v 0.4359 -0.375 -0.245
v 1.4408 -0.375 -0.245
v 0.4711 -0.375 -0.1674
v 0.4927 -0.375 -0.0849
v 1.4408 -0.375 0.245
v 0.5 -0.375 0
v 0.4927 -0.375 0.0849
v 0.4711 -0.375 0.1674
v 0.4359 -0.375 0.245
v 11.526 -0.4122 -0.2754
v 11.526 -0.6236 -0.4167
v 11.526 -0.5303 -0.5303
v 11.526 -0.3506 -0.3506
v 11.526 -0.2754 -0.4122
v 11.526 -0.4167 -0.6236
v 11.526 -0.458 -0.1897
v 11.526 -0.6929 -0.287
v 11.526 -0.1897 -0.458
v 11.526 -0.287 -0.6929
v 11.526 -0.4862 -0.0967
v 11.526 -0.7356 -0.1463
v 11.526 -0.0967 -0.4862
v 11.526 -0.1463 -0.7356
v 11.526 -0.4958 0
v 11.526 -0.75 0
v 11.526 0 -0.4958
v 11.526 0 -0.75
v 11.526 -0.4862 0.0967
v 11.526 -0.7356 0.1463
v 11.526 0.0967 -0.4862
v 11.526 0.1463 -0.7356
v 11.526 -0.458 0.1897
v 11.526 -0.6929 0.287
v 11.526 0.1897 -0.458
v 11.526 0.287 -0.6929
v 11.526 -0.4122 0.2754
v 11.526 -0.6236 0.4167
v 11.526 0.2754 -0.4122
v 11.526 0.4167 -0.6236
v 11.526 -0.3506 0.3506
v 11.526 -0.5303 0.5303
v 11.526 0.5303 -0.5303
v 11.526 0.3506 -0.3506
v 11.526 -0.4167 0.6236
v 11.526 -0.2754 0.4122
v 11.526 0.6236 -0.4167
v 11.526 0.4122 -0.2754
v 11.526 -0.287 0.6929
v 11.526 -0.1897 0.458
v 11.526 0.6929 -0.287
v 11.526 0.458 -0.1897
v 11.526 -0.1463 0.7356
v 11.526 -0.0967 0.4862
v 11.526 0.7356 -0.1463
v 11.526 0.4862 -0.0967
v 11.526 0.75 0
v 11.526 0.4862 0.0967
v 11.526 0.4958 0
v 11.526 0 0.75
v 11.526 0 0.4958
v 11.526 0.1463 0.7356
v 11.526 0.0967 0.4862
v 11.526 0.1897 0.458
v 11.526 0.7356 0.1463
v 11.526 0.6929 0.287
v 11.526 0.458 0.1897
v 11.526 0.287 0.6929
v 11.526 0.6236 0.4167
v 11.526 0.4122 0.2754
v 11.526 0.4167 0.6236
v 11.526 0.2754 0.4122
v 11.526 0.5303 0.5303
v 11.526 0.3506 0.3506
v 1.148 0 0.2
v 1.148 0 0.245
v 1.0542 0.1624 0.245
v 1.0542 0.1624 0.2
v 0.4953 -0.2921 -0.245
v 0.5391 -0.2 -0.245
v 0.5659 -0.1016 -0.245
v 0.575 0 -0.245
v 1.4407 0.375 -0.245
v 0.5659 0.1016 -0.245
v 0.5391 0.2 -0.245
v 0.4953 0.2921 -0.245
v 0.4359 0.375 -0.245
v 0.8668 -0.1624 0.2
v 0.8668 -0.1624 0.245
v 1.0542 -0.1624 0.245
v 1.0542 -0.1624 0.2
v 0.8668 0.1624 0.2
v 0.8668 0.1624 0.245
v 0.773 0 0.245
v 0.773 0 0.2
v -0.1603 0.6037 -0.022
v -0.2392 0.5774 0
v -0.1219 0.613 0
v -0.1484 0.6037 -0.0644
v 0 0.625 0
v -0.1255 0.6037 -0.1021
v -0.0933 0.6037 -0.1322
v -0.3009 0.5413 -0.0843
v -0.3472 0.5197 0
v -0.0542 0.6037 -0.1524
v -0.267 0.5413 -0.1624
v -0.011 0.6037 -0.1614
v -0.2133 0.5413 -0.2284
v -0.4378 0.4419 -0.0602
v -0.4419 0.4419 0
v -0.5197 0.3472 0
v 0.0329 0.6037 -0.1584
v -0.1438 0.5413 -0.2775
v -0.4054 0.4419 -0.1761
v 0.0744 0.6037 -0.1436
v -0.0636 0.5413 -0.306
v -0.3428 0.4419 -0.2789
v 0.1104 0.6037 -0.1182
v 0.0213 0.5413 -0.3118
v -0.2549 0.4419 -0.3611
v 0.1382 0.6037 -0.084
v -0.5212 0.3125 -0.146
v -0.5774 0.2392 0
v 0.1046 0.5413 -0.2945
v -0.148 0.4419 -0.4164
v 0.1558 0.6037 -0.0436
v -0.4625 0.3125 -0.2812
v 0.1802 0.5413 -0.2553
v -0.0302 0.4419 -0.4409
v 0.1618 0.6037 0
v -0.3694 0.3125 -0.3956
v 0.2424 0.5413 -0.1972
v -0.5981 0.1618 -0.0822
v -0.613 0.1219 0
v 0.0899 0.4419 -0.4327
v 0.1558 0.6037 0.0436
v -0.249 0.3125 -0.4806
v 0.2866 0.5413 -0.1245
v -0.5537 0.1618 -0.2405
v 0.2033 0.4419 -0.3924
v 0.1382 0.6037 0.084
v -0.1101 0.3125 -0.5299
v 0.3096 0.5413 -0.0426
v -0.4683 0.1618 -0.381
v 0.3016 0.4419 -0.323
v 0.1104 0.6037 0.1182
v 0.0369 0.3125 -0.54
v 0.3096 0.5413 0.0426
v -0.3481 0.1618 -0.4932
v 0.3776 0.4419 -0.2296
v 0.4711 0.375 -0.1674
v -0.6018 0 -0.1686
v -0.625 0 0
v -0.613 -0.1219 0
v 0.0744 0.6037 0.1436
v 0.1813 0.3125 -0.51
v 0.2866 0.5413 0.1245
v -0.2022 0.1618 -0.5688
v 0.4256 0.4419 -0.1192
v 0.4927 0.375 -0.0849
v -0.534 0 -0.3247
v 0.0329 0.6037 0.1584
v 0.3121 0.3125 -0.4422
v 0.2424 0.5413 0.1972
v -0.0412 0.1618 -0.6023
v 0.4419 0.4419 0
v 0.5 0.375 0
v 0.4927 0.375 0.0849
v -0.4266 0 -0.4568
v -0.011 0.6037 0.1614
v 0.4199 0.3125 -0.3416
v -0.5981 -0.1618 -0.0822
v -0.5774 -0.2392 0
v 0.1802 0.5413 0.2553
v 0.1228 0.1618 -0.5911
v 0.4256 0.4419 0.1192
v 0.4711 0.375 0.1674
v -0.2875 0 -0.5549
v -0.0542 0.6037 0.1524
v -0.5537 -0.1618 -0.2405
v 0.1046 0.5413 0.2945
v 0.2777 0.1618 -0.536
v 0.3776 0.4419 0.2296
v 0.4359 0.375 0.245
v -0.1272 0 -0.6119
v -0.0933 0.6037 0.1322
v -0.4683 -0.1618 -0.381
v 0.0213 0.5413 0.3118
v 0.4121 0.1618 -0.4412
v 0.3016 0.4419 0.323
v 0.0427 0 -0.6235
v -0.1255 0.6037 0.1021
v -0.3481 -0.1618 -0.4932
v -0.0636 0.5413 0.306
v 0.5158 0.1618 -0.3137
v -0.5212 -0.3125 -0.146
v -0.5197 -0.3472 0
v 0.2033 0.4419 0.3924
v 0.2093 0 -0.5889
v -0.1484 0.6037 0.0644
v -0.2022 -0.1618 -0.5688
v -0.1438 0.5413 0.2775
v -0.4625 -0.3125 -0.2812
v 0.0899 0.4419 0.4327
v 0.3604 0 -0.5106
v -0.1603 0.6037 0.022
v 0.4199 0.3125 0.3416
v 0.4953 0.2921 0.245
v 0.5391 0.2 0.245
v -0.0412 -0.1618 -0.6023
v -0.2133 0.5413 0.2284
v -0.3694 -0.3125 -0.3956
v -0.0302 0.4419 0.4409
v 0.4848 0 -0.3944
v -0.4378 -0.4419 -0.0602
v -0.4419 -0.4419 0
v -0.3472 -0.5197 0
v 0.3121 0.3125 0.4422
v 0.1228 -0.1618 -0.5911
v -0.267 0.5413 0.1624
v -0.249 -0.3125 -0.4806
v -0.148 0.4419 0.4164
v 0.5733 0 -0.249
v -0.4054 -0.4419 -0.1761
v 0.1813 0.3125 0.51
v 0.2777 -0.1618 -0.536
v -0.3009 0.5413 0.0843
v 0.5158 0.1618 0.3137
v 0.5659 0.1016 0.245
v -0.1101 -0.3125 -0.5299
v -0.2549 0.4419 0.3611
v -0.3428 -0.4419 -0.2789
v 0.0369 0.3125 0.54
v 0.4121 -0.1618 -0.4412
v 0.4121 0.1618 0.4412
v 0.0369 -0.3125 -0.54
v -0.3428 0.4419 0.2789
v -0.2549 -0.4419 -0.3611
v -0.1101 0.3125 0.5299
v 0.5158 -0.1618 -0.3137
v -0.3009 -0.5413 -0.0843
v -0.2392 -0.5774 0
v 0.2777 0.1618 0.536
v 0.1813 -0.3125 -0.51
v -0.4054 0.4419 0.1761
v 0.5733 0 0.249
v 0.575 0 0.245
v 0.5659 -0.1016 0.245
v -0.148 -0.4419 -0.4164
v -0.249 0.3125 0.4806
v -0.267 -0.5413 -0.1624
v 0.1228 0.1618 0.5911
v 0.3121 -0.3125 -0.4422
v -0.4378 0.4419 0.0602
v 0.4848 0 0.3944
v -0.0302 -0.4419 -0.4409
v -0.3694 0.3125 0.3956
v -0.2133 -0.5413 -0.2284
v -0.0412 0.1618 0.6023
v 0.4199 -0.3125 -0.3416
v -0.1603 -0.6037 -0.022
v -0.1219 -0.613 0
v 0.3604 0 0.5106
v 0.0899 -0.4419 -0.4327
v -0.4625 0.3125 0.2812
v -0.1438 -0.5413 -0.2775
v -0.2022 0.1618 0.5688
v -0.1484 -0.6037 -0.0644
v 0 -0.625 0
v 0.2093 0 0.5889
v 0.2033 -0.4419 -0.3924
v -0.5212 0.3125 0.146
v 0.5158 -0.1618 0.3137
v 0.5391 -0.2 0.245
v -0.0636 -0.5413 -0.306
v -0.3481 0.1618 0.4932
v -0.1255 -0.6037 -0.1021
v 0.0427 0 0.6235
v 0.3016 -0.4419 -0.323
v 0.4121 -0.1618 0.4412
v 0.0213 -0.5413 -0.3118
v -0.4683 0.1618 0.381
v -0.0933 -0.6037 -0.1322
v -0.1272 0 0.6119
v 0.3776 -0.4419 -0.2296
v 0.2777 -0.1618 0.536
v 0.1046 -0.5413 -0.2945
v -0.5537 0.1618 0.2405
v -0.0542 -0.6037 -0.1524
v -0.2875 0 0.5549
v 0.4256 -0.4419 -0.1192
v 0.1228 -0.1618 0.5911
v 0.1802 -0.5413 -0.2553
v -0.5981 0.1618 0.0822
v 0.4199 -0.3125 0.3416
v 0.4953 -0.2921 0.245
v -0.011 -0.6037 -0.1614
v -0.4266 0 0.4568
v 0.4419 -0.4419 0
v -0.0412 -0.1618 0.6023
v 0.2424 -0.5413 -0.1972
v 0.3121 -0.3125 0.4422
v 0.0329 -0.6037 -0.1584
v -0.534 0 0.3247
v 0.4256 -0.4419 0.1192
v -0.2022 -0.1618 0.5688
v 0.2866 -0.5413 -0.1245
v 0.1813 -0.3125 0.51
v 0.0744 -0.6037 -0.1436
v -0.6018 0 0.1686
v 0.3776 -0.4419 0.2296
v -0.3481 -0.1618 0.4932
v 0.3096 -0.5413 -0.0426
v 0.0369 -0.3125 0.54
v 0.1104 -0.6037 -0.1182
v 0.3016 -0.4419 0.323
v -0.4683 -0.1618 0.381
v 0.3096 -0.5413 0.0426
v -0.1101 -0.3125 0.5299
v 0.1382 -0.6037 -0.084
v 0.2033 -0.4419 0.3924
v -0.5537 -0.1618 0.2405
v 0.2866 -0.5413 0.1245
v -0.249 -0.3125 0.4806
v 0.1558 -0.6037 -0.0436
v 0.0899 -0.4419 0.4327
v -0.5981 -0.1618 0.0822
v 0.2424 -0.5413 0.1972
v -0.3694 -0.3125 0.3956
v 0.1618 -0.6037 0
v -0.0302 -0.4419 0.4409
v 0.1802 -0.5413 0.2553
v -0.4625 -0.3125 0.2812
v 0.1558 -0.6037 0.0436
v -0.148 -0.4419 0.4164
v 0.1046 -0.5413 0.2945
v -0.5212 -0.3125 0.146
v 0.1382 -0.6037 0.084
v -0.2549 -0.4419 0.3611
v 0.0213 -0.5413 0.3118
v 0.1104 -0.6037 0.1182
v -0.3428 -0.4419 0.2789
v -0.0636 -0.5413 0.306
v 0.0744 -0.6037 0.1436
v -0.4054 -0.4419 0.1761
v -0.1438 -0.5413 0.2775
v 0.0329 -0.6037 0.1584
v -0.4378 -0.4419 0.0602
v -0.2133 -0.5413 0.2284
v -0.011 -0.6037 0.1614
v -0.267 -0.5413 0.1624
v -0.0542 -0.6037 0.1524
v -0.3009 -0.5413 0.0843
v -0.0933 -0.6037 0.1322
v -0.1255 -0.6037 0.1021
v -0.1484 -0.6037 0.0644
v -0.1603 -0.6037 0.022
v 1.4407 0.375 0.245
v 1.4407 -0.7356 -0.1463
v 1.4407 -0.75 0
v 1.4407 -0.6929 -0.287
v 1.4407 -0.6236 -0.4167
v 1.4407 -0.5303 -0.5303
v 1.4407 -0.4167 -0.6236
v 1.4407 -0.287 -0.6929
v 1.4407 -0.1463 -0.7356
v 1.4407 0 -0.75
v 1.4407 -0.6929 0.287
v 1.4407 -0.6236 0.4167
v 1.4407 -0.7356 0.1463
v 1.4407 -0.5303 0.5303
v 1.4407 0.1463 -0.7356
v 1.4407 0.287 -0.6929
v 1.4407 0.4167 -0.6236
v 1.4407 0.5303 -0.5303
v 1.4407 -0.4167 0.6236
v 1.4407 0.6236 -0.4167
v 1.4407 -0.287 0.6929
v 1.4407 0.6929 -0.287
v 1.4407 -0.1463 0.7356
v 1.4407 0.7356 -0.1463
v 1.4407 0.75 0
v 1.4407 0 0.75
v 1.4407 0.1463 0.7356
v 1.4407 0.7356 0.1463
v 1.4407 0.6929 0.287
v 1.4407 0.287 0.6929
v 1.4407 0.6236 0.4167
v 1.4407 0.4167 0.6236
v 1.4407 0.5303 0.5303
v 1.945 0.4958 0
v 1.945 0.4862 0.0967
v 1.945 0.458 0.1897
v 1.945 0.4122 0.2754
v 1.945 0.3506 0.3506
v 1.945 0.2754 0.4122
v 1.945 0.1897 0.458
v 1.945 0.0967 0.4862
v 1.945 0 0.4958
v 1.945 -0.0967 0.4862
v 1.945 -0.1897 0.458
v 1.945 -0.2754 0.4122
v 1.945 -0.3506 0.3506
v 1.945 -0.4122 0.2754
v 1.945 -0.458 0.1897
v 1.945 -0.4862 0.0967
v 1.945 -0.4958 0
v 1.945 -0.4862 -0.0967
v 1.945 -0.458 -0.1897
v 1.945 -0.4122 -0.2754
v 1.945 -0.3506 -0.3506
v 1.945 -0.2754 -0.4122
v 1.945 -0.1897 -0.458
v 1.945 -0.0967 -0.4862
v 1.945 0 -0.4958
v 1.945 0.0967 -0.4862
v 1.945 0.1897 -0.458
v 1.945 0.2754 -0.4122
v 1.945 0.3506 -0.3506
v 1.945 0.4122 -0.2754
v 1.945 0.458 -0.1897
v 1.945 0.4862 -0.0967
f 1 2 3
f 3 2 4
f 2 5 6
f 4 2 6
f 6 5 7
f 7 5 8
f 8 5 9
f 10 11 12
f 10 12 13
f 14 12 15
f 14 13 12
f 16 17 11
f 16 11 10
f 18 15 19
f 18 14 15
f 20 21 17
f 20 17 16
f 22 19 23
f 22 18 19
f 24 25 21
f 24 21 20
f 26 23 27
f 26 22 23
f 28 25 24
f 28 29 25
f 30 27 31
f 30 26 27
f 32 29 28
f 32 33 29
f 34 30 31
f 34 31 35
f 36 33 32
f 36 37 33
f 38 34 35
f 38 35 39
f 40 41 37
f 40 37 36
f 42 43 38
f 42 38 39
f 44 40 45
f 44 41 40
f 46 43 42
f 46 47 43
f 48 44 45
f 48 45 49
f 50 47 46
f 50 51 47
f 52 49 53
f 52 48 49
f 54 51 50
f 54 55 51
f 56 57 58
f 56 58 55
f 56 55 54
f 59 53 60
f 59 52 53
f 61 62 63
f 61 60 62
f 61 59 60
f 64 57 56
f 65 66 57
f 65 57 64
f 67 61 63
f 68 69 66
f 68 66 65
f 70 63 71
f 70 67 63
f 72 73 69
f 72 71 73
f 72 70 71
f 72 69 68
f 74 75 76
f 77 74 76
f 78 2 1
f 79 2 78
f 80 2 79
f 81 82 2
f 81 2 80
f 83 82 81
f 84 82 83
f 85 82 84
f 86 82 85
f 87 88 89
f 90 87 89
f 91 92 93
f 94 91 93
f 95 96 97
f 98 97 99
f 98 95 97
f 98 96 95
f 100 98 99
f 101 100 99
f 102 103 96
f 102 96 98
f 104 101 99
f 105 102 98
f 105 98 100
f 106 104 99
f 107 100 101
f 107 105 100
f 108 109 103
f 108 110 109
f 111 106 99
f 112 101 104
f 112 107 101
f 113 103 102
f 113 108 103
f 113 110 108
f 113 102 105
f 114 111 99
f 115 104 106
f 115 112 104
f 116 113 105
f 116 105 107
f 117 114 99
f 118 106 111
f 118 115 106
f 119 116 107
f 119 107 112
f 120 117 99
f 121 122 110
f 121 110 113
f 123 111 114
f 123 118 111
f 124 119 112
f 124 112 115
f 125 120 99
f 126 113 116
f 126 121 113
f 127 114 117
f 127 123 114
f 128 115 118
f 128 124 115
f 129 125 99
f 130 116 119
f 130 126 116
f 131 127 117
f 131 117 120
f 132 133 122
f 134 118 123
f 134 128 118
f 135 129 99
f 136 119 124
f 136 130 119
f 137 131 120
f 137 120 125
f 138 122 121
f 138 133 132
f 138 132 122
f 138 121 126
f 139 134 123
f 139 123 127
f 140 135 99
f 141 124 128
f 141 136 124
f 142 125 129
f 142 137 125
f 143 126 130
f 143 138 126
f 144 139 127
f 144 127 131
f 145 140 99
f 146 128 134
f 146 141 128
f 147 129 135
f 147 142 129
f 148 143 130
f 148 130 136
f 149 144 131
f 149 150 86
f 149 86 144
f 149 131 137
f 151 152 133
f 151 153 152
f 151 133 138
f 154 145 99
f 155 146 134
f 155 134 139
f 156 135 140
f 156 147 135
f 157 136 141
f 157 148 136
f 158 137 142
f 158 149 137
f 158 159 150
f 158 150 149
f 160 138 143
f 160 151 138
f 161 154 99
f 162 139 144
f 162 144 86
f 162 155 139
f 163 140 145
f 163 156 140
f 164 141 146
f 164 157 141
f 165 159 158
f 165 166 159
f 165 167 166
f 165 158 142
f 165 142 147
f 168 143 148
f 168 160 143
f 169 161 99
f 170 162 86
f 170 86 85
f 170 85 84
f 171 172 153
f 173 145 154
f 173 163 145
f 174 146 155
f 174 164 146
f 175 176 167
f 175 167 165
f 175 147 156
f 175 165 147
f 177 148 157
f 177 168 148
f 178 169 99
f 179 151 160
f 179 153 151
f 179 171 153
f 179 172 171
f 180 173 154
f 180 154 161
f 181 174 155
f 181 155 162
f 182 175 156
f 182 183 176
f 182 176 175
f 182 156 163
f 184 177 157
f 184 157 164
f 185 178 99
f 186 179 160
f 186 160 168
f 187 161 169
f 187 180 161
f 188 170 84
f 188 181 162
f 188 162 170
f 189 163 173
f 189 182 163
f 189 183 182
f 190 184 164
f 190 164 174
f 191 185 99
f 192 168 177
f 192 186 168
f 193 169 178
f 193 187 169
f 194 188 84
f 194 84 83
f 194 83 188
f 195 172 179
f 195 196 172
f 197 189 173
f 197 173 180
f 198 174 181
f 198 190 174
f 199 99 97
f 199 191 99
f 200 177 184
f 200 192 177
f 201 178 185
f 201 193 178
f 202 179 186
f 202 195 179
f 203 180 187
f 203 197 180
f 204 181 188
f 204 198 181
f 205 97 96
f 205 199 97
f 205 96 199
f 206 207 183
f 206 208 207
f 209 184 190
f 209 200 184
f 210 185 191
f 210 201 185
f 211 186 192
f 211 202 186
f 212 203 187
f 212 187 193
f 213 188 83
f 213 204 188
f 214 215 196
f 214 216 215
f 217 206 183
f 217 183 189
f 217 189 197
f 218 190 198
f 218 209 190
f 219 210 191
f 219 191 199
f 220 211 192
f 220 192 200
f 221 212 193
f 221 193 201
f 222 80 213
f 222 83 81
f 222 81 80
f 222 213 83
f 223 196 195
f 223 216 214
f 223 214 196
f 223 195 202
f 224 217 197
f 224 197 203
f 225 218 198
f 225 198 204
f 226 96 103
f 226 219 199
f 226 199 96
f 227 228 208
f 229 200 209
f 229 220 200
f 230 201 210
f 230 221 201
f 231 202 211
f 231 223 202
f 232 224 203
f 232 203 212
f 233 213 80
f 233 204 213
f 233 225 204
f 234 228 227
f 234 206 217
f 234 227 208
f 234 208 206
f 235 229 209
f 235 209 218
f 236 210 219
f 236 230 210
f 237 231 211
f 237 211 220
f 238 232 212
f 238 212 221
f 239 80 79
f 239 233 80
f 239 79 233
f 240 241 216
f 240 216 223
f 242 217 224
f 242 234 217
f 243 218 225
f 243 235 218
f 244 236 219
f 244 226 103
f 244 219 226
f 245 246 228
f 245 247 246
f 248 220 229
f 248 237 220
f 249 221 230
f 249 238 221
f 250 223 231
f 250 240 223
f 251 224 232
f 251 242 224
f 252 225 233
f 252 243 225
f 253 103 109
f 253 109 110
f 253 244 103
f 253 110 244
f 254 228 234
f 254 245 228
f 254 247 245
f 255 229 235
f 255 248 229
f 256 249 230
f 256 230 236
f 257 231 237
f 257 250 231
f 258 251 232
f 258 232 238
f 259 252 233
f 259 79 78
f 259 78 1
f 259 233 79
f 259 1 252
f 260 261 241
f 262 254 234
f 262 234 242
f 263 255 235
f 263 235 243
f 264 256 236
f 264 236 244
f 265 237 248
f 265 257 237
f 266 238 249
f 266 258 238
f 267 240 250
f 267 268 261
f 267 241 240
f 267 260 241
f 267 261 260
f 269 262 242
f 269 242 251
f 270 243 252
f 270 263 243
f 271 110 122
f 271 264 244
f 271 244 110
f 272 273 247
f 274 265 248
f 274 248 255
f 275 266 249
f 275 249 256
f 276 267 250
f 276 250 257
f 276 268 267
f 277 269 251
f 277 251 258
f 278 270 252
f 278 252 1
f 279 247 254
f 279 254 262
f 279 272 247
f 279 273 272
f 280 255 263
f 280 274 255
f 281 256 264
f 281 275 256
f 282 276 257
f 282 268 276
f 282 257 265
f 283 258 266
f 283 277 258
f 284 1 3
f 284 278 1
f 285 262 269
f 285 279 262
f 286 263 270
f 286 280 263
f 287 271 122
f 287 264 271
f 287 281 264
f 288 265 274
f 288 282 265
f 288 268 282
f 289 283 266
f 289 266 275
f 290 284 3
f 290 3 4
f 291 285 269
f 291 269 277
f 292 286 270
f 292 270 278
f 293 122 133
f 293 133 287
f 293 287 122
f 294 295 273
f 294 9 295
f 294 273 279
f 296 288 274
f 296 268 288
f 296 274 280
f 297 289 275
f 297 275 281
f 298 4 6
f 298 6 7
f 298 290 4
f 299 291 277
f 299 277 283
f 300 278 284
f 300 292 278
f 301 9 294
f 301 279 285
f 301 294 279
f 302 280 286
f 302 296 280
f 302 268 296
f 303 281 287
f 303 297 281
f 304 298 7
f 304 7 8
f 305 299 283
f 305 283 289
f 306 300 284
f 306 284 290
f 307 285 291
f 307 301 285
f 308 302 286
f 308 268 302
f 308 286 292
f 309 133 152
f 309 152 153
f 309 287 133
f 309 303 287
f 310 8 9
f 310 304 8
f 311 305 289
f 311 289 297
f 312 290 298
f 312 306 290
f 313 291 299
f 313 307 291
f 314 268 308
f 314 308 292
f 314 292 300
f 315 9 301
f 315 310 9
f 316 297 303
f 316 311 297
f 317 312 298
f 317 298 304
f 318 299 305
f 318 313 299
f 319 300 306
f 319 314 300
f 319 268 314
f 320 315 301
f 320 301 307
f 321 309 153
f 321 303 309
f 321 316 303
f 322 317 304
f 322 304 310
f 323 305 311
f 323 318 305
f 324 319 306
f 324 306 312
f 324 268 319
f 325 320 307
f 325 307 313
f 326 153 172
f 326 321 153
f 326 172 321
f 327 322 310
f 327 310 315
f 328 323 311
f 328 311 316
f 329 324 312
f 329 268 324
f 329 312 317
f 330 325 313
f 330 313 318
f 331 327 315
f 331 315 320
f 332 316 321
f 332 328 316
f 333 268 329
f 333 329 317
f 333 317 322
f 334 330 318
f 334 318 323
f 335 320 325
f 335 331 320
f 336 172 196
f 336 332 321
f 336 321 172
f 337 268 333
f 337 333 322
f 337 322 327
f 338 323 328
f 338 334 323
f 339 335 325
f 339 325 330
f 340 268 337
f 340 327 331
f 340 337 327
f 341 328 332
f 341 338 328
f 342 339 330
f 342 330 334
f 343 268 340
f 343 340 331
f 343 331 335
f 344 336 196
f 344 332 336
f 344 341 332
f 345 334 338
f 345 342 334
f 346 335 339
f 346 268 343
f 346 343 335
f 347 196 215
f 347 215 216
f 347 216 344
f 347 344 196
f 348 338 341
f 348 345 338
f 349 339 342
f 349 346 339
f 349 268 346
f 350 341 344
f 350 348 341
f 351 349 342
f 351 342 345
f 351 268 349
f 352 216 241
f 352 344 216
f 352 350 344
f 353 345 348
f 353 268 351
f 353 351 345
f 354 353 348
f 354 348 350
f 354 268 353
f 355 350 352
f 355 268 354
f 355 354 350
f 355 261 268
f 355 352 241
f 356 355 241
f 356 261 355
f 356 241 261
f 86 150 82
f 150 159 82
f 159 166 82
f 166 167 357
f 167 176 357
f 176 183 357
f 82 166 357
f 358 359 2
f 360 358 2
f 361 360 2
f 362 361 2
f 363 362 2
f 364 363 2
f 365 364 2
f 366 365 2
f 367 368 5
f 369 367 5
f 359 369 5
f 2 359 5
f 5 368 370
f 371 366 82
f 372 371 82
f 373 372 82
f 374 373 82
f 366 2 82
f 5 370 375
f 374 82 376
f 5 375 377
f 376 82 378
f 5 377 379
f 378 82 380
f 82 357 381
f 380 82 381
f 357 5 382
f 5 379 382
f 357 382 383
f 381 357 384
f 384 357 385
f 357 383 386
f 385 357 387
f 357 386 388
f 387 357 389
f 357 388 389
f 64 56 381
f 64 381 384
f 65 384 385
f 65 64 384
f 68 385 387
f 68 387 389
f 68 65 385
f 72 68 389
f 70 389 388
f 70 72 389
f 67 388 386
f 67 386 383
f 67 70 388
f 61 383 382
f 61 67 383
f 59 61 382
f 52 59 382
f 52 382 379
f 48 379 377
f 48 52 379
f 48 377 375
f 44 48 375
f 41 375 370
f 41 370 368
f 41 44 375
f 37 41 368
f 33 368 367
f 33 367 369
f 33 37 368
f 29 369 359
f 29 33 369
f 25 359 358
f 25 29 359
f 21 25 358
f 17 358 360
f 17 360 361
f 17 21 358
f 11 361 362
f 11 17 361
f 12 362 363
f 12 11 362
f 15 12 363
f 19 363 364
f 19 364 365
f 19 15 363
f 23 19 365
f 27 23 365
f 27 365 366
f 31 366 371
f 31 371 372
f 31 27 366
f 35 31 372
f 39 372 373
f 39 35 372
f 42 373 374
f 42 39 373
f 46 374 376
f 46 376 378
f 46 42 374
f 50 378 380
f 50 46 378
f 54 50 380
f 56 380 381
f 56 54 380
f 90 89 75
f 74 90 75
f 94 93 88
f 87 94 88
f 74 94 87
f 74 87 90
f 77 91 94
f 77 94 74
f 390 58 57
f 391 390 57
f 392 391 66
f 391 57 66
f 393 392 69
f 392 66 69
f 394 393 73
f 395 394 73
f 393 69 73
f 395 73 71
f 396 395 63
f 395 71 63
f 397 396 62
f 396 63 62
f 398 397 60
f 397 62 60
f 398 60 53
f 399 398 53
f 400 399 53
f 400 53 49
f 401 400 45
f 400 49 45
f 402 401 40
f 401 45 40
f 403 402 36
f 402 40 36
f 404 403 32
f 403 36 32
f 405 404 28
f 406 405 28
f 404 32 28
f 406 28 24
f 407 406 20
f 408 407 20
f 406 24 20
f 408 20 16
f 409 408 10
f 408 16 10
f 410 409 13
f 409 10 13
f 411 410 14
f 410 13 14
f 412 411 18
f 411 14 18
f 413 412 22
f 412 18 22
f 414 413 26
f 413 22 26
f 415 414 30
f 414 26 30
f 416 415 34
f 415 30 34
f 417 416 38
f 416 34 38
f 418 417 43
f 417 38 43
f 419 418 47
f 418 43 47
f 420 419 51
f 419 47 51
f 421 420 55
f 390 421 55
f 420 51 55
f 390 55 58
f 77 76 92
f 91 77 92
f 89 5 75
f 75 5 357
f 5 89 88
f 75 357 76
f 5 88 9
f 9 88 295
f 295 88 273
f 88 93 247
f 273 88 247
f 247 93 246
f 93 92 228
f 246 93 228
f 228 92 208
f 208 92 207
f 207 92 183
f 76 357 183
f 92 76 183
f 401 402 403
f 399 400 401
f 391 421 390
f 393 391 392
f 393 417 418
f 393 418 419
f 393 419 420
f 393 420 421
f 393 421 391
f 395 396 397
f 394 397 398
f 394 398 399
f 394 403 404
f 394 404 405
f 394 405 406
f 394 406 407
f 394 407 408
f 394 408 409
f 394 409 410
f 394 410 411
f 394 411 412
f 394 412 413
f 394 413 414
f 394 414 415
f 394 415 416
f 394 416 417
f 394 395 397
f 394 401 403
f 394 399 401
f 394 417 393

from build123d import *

# Parameters (mm, degrees)
PAD_DEPTH       = 0.245
POCKET_DEPTH    = 0.05
SKETCH004_R     = 0.75
PAD001_DEPTH    = 10.08525
SKETCH005_R     = 3
HOLE_DEPTH      = 26
SKETCH006_R     = 0.495763
POCKET001_DEPTH = 9.580987


with BuildPart() as part:
    # Sketch → Pad (new body, symmetric)
    with BuildSketch(Plane.XY):
        with BuildLine():
            Line((0, 0.375), (19.21, 0.375))
            ThreePointArc((19.21, -0.375), (19.585, 0), (19.21, 0.375))
            Line((19.21, -0.375), (0, -0.375))
            ThreePointArc((0, 0.375), (-0.375, 0), (0, -0.375))
        make_face()
    extrude(amount=PAD_DEPTH, both=True)

    # Sketch001 → Revolution (revolve)
    with BuildSketch(Plane.XY):
        with BuildLine():
            Line((0, 0.625), (0, 0))
            Line((0, 0), (0, -0.625))
            ThreePointArc((0, 0.625), (-0.625, 0), (0, -0.625))
        make_face()
    revolve(axis=Axis((0, 0, 0), (0, -1, 0)))

    # Sketch002 → Revolution001 (revolve)
    with BuildSketch(Plane.XY):
        with BuildLine():
            ThreePointArc((19.21, -0.625), (19.835, 0), (19.21, 0.625))
            Line((19.21, 0.625), (19.21, 0))
            Line((19.21, 0), (19.21, -0.625))
        make_face()
    revolve(axis=Axis((19.21, 0, 0), (0, -1, 0)))

    # Sketch003 (on DatumPlane) → Pocket (cut)
    with BuildSketch(Plane.XY.offset(0.25)):
        Polygon((1.05425, -0.16238), (1.148, 0), (1.05425, 0.16238), (0.86675, 0.16238), (0.773, 0), (0.86675, -0.16238), align=None)
    extrude(amount=-POCKET_DEPTH, mode=Mode.SUBTRACT)

    # Sketch004 (on DatumPlane) → Pad001 (join)
    with BuildSketch(Plane.YZ.offset(11.526)):
        Circle(SKETCH004_R)
    extrude(amount=-PAD001_DEPTH)

    # Sketch005 (on DatumPlane) → Hole (cut)
    with BuildSketch(Plane.YZ.offset(11.526)):
        Circle(SKETCH005_R)
    extrude(amount=HOLE_DEPTH, mode=Mode.SUBTRACT)

    # Sketch006 (on DatumPlane) → Pocket001 (cut)
    with BuildSketch(Plane.YZ.offset(11.526)):
        Circle(SKETCH006_R)
    extrude(amount=-POCKET001_DEPTH, mode=Mode.SUBTRACT)


solid = part.part
